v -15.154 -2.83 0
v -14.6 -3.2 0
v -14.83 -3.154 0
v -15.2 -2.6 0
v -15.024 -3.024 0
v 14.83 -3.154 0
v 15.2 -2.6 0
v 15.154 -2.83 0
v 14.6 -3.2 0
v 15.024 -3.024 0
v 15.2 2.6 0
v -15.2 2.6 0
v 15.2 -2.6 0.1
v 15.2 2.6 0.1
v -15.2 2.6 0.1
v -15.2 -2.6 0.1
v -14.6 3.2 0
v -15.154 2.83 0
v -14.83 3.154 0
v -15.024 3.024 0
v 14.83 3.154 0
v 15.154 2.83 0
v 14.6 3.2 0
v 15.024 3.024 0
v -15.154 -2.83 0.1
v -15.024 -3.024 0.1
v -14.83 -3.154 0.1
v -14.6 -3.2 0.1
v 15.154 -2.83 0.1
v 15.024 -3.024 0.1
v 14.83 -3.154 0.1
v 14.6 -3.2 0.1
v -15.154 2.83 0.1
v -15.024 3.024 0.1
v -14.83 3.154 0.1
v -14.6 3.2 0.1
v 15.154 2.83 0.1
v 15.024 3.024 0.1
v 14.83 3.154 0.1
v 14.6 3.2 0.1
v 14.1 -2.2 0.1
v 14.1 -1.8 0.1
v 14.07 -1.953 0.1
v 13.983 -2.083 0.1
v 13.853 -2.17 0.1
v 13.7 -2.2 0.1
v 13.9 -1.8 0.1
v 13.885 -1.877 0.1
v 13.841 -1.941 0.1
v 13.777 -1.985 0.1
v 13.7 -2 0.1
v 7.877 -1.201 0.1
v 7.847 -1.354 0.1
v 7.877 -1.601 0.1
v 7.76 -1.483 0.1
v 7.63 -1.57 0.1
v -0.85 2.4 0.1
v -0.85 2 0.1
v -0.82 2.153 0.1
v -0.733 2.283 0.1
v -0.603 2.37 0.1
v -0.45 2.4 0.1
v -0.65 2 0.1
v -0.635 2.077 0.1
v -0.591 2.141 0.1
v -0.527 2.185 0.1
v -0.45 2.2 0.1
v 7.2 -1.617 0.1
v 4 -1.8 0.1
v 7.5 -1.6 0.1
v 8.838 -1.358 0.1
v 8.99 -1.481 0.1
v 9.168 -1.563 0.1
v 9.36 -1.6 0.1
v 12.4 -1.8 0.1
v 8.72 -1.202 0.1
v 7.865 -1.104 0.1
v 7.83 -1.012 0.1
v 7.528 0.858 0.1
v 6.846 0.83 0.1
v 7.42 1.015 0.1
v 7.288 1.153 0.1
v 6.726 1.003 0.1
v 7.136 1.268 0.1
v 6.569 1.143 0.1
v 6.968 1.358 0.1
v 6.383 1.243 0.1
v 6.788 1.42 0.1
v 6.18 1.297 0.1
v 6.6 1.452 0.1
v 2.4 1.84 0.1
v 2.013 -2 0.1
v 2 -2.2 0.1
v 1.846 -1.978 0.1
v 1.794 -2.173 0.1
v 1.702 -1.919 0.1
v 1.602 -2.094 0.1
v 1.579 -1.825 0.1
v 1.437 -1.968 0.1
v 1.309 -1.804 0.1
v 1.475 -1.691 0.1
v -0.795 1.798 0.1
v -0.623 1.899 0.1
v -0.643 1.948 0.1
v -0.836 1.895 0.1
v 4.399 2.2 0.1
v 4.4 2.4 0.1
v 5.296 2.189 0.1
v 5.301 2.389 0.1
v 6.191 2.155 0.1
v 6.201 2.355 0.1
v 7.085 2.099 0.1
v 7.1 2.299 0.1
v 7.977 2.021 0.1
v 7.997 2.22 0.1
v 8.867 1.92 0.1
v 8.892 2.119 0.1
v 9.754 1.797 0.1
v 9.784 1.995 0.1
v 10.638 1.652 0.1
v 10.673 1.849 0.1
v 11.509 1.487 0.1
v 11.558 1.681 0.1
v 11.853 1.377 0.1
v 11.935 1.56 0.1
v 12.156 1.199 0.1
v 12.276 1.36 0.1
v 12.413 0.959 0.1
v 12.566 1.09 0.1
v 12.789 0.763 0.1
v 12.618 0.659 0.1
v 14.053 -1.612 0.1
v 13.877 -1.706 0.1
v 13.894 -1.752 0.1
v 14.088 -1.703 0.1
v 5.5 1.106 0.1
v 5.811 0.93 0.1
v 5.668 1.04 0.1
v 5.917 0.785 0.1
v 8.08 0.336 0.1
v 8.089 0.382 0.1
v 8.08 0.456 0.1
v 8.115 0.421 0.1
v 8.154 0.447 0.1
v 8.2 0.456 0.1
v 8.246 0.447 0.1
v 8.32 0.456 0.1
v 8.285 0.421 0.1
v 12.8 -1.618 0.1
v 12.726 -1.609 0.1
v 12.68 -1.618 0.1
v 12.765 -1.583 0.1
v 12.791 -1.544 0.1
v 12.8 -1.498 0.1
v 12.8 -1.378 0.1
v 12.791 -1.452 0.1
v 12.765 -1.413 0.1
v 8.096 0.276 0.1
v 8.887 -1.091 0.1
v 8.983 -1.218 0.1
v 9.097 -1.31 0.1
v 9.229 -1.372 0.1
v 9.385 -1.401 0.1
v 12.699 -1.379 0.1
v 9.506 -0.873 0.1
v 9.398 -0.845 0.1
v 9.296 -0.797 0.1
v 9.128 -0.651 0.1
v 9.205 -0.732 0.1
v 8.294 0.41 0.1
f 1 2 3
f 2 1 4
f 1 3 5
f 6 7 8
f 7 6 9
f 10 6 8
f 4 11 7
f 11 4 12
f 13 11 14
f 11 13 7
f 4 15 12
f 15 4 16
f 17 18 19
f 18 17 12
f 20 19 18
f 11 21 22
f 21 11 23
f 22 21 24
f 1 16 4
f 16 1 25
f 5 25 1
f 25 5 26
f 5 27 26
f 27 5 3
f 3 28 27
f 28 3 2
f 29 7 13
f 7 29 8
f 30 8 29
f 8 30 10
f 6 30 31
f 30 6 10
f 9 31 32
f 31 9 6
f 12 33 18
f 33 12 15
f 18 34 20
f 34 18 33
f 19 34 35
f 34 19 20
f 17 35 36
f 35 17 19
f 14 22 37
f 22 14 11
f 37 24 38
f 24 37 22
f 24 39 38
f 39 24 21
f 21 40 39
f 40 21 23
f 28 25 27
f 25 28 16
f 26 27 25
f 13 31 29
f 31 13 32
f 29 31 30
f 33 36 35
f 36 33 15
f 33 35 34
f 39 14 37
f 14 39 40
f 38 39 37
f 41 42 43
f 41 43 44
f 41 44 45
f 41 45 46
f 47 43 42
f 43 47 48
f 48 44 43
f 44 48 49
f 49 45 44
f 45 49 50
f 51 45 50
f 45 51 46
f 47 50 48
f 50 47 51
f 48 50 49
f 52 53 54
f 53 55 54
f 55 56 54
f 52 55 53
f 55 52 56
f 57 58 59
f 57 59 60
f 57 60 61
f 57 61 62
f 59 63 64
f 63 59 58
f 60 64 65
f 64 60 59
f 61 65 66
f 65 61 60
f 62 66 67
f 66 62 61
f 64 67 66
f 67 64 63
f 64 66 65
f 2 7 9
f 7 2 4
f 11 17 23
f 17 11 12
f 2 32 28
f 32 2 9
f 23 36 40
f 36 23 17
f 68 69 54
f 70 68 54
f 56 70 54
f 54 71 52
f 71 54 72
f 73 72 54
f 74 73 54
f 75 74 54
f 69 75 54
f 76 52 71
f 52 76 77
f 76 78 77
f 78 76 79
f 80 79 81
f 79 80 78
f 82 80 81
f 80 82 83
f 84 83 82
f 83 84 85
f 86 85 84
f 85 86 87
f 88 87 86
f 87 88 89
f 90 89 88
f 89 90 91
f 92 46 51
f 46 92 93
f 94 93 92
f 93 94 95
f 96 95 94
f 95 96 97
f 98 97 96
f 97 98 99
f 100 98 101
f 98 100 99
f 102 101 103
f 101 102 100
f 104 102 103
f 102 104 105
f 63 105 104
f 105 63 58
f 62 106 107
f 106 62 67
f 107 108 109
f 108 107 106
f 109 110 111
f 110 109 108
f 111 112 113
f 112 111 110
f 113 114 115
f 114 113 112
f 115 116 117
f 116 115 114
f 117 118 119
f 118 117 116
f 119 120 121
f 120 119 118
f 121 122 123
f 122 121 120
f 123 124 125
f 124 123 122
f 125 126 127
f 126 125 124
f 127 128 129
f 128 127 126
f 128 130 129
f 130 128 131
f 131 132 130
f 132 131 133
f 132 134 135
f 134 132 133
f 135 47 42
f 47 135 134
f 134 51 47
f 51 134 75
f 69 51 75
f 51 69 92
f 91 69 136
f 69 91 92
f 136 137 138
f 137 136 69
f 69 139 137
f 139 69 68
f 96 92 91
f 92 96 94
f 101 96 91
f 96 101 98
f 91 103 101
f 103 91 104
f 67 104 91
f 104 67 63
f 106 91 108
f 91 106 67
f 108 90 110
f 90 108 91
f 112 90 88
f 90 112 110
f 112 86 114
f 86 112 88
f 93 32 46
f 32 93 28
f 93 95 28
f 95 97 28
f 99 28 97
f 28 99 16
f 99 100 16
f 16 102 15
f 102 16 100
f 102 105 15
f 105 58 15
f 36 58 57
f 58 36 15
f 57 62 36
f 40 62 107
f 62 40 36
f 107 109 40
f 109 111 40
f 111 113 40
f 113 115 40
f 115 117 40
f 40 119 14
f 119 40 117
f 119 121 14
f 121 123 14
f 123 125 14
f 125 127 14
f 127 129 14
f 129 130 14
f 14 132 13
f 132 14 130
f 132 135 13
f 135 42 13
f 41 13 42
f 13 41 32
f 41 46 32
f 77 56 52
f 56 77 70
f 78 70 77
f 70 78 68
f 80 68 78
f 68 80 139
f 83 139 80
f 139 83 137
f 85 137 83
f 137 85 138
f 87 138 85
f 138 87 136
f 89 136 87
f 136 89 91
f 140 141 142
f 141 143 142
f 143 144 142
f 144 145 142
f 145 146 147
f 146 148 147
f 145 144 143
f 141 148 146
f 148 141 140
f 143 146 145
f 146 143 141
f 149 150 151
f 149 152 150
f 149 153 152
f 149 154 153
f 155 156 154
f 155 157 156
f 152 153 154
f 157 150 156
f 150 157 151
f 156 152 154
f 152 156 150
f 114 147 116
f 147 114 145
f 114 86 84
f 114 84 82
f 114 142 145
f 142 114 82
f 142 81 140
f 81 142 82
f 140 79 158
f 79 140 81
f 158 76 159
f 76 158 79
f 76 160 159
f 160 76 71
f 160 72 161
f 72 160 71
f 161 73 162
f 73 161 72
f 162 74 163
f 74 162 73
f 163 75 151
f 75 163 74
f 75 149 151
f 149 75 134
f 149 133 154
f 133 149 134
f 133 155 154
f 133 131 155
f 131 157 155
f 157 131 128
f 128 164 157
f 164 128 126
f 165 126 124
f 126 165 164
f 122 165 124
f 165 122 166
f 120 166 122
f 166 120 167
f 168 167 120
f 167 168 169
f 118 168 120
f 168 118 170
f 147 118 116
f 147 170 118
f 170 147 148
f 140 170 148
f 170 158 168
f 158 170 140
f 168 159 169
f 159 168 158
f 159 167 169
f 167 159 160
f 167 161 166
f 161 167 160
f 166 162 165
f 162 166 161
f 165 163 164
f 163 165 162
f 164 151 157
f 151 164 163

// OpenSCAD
// file: ../p/box3u12.scad
use <../lib.scad>
function ldraw_lib__box3u12() = [
// 0 Box with 3 Parallel Faces without Any Edges
// 0 Name: box3u12.dat
// 0 Author: J.C. Tchang [tchang]
// 0 !LDRAW_ORG Primitive UPDATE 2014-02
// 0 !LICENSE Licensed under CC BY 4.0 : see CAreadme.txt
// 
// 0 BFC CERTIFY CCW
  [0,"BFC","CERTIFY"],
  [0,"BFC","CCW"],
// 
// 0 !HISTORY 2014-12-23 [PTadmin] Official Update 2014-02
// 
// 
// 4 16 -1 1 1 1 1 1 1 1 -1 -1 1 -1
  [4,16,-1,1,1,1,1,1,1,1,-1,-1,1,-1],
// 4 16 -1 1 1 -1 0 1 1 0 1 1 1 1
  [4,16,-1,1,1,-1,0,1,1,0,1,1,1,1],
// 4 16 1 1 -1 1 0 -1 -1 0 -1 -1 1 -1
  [4,16,1,1,-1,1,0,-1,-1,0,-1,-1,1,-1],
];
module ldraw_lib__box3u12(step=0, col=false, unit=2/5, alt=false, line=0.2, solid=!$preview)
    makepoly(ldraw_lib__box3u12(), step=step, col=col, unit=unit, alt=alt, line=line, solid=solid);
ldraw_lib__box3u12(line=0.2);
// file: ../p/3-16ndis.scad
use <../lib.scad>
function ldraw_lib__3_16ndis() = [
// 0 Disc Negative 0.1875
// 0 Name: 3-16ndis.dat
// 0 Author: Magnus Forsberg [MagFors]
// 0 !LDRAW_ORG Primitive UPDATE 2024-01
// 0 !LICENSE Licensed under CC BY 4.0 : see CAreadme.txt
// 
// 0 BFC CERTIFY CCW
  [0,"BFC","CERTIFY"],
  [0,"BFC","CCW"],
// 
// 0 !HISTORY 2009-05-02 [PTadmin] Official Update 2009-01
// 0 !HISTORY 2024-01-03 [MagFors] Complete regeneration, original by guyvivan
// 0 !HISTORY 2024-01-29 [OrionP] Official Update 2024-01
// 
// 3 16 1 0 1 0.9239 0 0.3827 1 0 0
  [3,16,1,0,1,0.9239,0,0.3827,1,0,0],
// 3 16 1 0 1 0.7071 0 0.7071 0.9239 0 0.3827
  [3,16,1,0,1,0.7071,0,0.7071,0.9239,0,0.3827],
// 3 16 1 0 1 0.3827 0 0.9239 0.7071 0 0.7071
  [3,16,1,0,1,0.3827,0,0.9239,0.7071,0,0.7071],
// 0 // Build by LDPartEditor (PrimGen 2.X)
];
module ldraw_lib__3_16ndis(step=0, col=false, unit=2/5, alt=false, line=0.2, solid=!$preview)
    makepoly(ldraw_lib__3_16ndis(), step=step, col=col, unit=unit, alt=alt, line=line, solid=solid);
ldraw_lib__3_16ndis(line=0.2);
// file: ../p/3-16chrd.scad
use <../lib.scad>
function ldraw_lib__3_16chrd() = [
// 0 Chord 0.1875
// 0 Name: 3-16chrd.dat
// 0 Author: Niels Karsdorp [nielsk]
// 0 !LDRAW_ORG Primitive UPDATE 2009-01
// 0 !LICENSE Licensed under CC BY 4.0 : see CAreadme.txt
// 
// 0 BFC CERTIFY CCW
  [0,"BFC","CERTIFY"],
  [0,"BFC","CCW"],
// 
// 0 !HISTORY 2009-05-02 [PTadmin] Official Update 2009-01
// 
// 
// 4 16 1 0 0 0.9239 0 0.3827 0.7071 0 0.7071 0.3827 0 0.9239
  [4,16,1,0,0,0.9239,0,0.3827,0.7071,0,0.7071,0.3827,0,0.9239],
// 0
// 
];
module ldraw_lib__3_16chrd(step=0, col=false, unit=2/5, alt=false, line=0.2, solid=!$preview)
    makepoly(ldraw_lib__3_16chrd(), step=step, col=col, unit=unit, alt=alt, line=line, solid=solid);
ldraw_lib__3_16chrd(line=0.2);
// file: ../p/1-4ring1.scad
use <../lib.scad>
function ldraw_lib__1_4ring1() = [
// 0 Ring  1 x 0.25
// 0 Name: 1-4ring1.dat
// 0 Author: Chris Dee [cwdee]
// 0 !LDRAW_ORG Primitive UPDATE 2012-01
// 0 !LICENSE Licensed under CC BY 4.0 : see CAreadme.txt
// 
// 0 BFC CERTIFY CCW
  [0,"BFC","CERTIFY"],
  [0,"BFC","CCW"],
// 
// 0 !HISTORY 2000-05-07 [PTadmin] Official Update 2000-01
// 0 !HISTORY 2002-11-22 [hafhead] Added BFC statement
// 0 !HISTORY 2002-11-30 [PTadmin] Official Update 2002-05
// 0 !HISTORY 2007-06-22 [PTadmin] Header formatted for Contributor Agreement
// 0 !HISTORY 2008-07-01 [PTadmin] Official Update 2008-01
// 0 !HISTORY 2012-02-16 [Philo] Changed to CCW
// 0 !HISTORY 2012-03-30 [PTadmin] Official Update 2012-01
// 
// 
// 4 16 2 0 0 1.8478 0 0.7654 0.9239 0 0.3827 1 0 0
  [4,16,2,0,0,1.8478,0,0.7654,0.9239,0,0.3827,1,0,0],
// 4 16 1.8478 0 0.7654 1.4142 0 1.4142 0.7071 0 0.7071 0.9239 0 0.3827
  [4,16,1.8478,0,0.7654,1.4142,0,1.4142,0.7071,0,0.7071,0.9239,0,0.3827],
// 4 16 1.4142 0 1.4142 0.7654 0 1.8478 0.3827 0 0.9239 0.7071 0 0.7071
  [4,16,1.4142,0,1.4142,0.7654,0,1.8478,0.3827,0,0.9239,0.7071,0,0.7071],
// 4 16 0.7654 0 1.8478 0 0 2 0 0 1 0.3827 0 0.9239
  [4,16,0.7654,0,1.8478,0,0,2,0,0,1,0.3827,0,0.9239],
];
module ldraw_lib__1_4ring1(step=0, col=false, unit=2/5, alt=false, line=0.2, solid=!$preview)
    makepoly(ldraw_lib__1_4ring1(), step=step, col=col, unit=unit, alt=alt, line=line, solid=solid);
ldraw_lib__1_4ring1(line=0.2);
// file: ../p/1-4ndis.scad
use <../lib.scad>
function ldraw_lib__1_4ndis() = [
// 0 Disc Negative 0.25
// 0 Name: 1-4ndis.dat
// 0 Author: James Jessiman
// 0 !LDRAW_ORG Primitive UPDATE 2012-01
// 0 !LICENSE Licensed under CC BY 4.0 : see CAreadme.txt
// 
// 0 BFC CERTIFY CCW
  [0,"BFC","CERTIFY"],
  [0,"BFC","CCW"],
// 
// 0 !HISTORY 2002-03-23 [sbliss] Added BFC Statement
// 0 !HISTORY 2002-04-25 [PTadmin] Official Update 2002-02
// 0 !HISTORY 2007-06-22 [PTadmin] Header formatted for Contributor Agreement
// 0 !HISTORY 2008-07-01 [PTadmin] Official Update 2008-01
// 0 !HISTORY 2012-02-16 [Philo] Changed to CCW
// 0 !HISTORY 2012-03-30 [PTadmin] Official Update 2012-01
// 
// 
// 3 16 0.9239 0 0.3827 1 0 0 1 0 1
  [3,16,0.9239,0,0.3827,1,0,0,1,0,1],
// 3 16 0.7071 0 0.7071 0.9239 0 0.3827 1 0 1
  [3,16,0.7071,0,0.7071,0.9239,0,0.3827,1,0,1],
// 3 16 0.3827 0 0.9239 0.7071 0 0.7071 1 0 1
  [3,16,0.3827,0,0.9239,0.7071,0,0.7071,1,0,1],
// 3 16 0 0 1 0.3827 0 0.9239 1 0 1
  [3,16,0,0,1,0.3827,0,0.9239,1,0,1],
];
module ldraw_lib__1_4ndis(step=0, col=false, unit=2/5, alt=false, line=0.2, solid=!$preview)
    makepoly(ldraw_lib__1_4ndis(), step=step, col=col, unit=unit, alt=alt, line=line, solid=solid);
ldraw_lib__1_4ndis(line=0.2);
// file: ../p/1-4cyli.scad
use <../lib.scad>
function ldraw_lib__1_4cyli() = [
// 0 Cylinder 0.25
// 0 Name: 1-4cyli.dat
// 0 Author: James Jessiman
// 0 !LDRAW_ORG Primitive UPDATE 2012-01
// 0 !LICENSE Licensed under CC BY 4.0 : see CAreadme.txt
// 
// 0 BFC CERTIFY CCW
  [0,"BFC","CERTIFY"],
  [0,"BFC","CCW"],
// 
// 0 !HISTORY 2002-03-23 [sbliss] Added BFC statement.
// 0 !HISTORY 2002-04-25 [PTadmin] Official Update 2002-02
// 0 !HISTORY 2007-06-22 [PTadmin] Header formatted for Contributor Agreement
// 0 !HISTORY 2008-07-01 [PTadmin] Official Update 2008-01
// 0 !HISTORY 2012-02-16 [Philo] Changed to CCW
// 0 !HISTORY 2012-03-30 [PTadmin] Official Update 2012-01
// 
// 
// 4 16 1 1 0 0.9239 1 0.3827 0.9239 0 0.3827 1 0 0
  [4,16,1,1,0,0.9239,1,0.3827,0.9239,0,0.3827,1,0,0],
// 5 24 1 0 0 1 1 0 0.9239 0 0.3827 1 0 -1
  [5,24,1,0,0,1,1,0,0.9239,0,0.3827,1,0,-1],
// 4 16 0.9239 1 0.3827 0.7071 1 0.7071 0.7071 0 0.7071 0.9239 0 0.3827
  [4,16,0.9239,1,0.3827,0.7071,1,0.7071,0.7071,0,0.7071,0.9239,0,0.3827],
// 5 24 0.9239 0 0.3827 0.9239 1 0.3827 0.7071 0 0.7071 1 0 0
  [5,24,0.9239,0,0.3827,0.9239,1,0.3827,0.7071,0,0.7071,1,0,0],
// 4 16 0.7071 1 0.7071 0.3827 1 0.9239 0.3827 0 0.9239 0.7071 0 0.7071
  [4,16,0.7071,1,0.7071,0.3827,1,0.9239,0.3827,0,0.9239,0.7071,0,0.7071],
// 5 24 0.7071 0 0.7071 0.7071 1 0.7071 0.3827 0 0.9239 0.9239 0 0.3827
  [5,24,0.7071,0,0.7071,0.7071,1,0.7071,0.3827,0,0.9239,0.9239,0,0.3827],
// 4 16 0.3827 1 0.9239 0 1 1 0 0 1 0.3827 0 0.9239
  [4,16,0.3827,1,0.9239,0,1,1,0,0,1,0.3827,0,0.9239],
// 5 24 0.3827 0 0.9239 0.3827 1 0.9239 0 0 1 0.7071 0 0.7071
  [5,24,0.3827,0,0.9239,0.3827,1,0.9239,0,0,1,0.7071,0,0.7071],
// 5 24 0 0 1 0 1 1 0.3827 0 0.9239 -1 0 1
  [5,24,0,0,1,0,1,1,0.3827,0,0.9239,-1,0,1],
];
module ldraw_lib__1_4cyli(step=0, col=false, unit=2/5, alt=false, line=0.2, solid=!$preview)
    makepoly(ldraw_lib__1_4cyli(), step=step, col=col, unit=unit, alt=alt, line=line, solid=solid);
ldraw_lib__1_4cyli(line=0.2);
// file: ../p/1-4chrd.scad
use <../lib.scad>
function ldraw_lib__1_4chrd() = [
// 0 Chord 0.25
// 0 Name: 1-4chrd.dat
// 0 Author: Max Martin Richter [MMR1988]
// 0 !LDRAW_ORG Primitive UPDATE 2023-05
// 0 !LICENSE Licensed under CC BY 4.0 : see CAreadme.txt
// 
// 0 BFC CERTIFY CCW
  [0,"BFC","CERTIFY"],
  [0,"BFC","CCW"],
// 
// 0 !HISTORY 2004-04-22 [PTadmin] Official Update 2004-02
// 0 !HISTORY 2007-10-09 [PTadmin] Header formatted for Contributor Agreement
// 0 !HISTORY 2008-07-01 [PTadmin] Official Update 2008-01
// 0 !HISTORY 2012-08-02 [MMR1988] Re-creation with PrimGen2 and Rectifier
// 0 !HISTORY 2012-08-09 [PTadmin] Official Update 2012-02
// 0 !HISTORY 2023-10-27 [OrionP] Change author to MMR1988 from hafhead
// 0 !HISTORY 2023-10-31 [OrionP] Official Update 2023-05
// 
// 4 16 0.9239 0 0.3827 0.3827 0 0.9239 0 0 1 1 0 0
  [4,16,0.9239,0,0.3827,0.3827,0,0.9239,0,0,1,1,0,0],
// 3 16 0.7071 0 0.7071 0.3827 0 0.9239 0.9239 0 0.3827
  [3,16,0.7071,0,0.7071,0.3827,0,0.9239,0.9239,0,0.3827],
];
module ldraw_lib__1_4chrd(step=0, col=false, unit=2/5, alt=false, line=0.2, solid=!$preview)
    makepoly(ldraw_lib__1_4chrd(), step=step, col=col, unit=unit, alt=alt, line=line, solid=solid);
ldraw_lib__1_4chrd(line=0.2);
// file: ../p/3-8ndis.scad
use <../lib.scad>
function ldraw_lib__3_8ndis() = [
// 0 Disc Negative 0.375
// 0 Name: 3-8ndis.dat
// 0 Author: Alex Taylor [anathema]
// 0 !LDRAW_ORG Primitive UPDATE 2009-02
// 0 !LICENSE Licensed under CC BY 4.0 : see CAreadme.txt
// 
// 0 BFC CERTIFY CCW
  [0,"BFC","CERTIFY"],
  [0,"BFC","CCW"],
// 
// 0 !HISTORY 2009-09-03 [PTadmin] Official Update 2009-02
// 
// 
// 3 16 1 0 1 0.9239 0 0.3827 1 0 0
  [3,16,1,0,1,0.9239,0,0.3827,1,0,0],
// 3 16 1 0 1 0.7071 0 0.7071 0.9239 0 0.3827
  [3,16,1,0,1,0.7071,0,0.7071,0.9239,0,0.3827],
// 3 16 1 0 1 0.3827 0 0.9239 0.7071 0 0.7071
  [3,16,1,0,1,0.3827,0,0.9239,0.7071,0,0.7071],
// 3 16 1 0 1 0 0 1 0.3827 0 0.9239
  [3,16,1,0,1,0,0,1,0.3827,0,0.9239],
// 3 16 -1 0 1 -0.3827 0 0.9239 0 0 1
  [3,16,-1,0,1,-0.3827,0,0.9239,0,0,1],
// 3 16 -1 0 1 -0.7071 0 0.7071 -0.3827 0 0.9239
  [3,16,-1,0,1,-0.7071,0,0.7071,-0.3827,0,0.9239],
// 0
];
module ldraw_lib__3_8ndis(step=0, col=false, unit=2/5, alt=false, line=0.2, solid=!$preview)
    makepoly(ldraw_lib__3_8ndis(), step=step, col=col, unit=unit, alt=alt, line=line, solid=solid);
ldraw_lib__3_8ndis(line=0.2);
// file: ../p/3-8chrd.scad
use <../lib.scad>
function ldraw_lib__3_8chrd() = [
// 0 Chord 0.375
// 0 Name: 3-8chrd.dat
// 0 Author: Donald Sutter [technog]
// 0 !LDRAW_ORG Primitive UPDATE 2005-01
// 0 !LICENSE Licensed under CC BY 4.0 : see CAreadme.txt
// 
// 0 BFC CERTIFY CCW
  [0,"BFC","CERTIFY"],
  [0,"BFC","CCW"],
// 
// 0 !HISTORY 2004-01-07 [Steffen] added primitive code for POVray
// 0 !HISTORY 2004-03-18 [mkennedy] removed pov code and rearanged polygons.
// 0 !HISTORY 2004-09-12 [cwdee] reversed winding and standardised precision
// 0 !HISTORY 2005-12-28 [PTadmin] Official Update 2005-01
// 0 !HISTORY 2007-06-24 [PTadmin] Header formatted for Contributor Agreement
// 0 !HISTORY 2008-07-01 [PTadmin] Official Update 2008-01
// 
// 
// 3 16 0.7071 0 0.7071 0.3827 0 0.9239 0 0 1
  [3,16,0.7071,0,0.7071,0.3827,0,0.9239,0,0,1],
// 4 16 0.9239 0 0.3827 -0.3827 0 0.9239 -0.7071 0 0.7071 1 0 0
  [4,16,0.9239,0,0.3827,-0.3827,0,0.9239,-0.7071,0,0.7071,1,0,0],
// 4 16 0.7071 0 0.7071 0 0 1 -0.3827 0 0.9239 0.9239 0 0.3827
  [4,16,0.7071,0,0.7071,0,0,1,-0.3827,0,0.9239,0.9239,0,0.3827],
// 0
];
module ldraw_lib__3_8chrd(step=0, col=false, unit=2/5, alt=false, line=0.2, solid=!$preview)
    makepoly(ldraw_lib__3_8chrd(), step=step, col=col, unit=unit, alt=alt, line=line, solid=solid);
ldraw_lib__3_8chrd(line=0.2);
// main file
use <../lib.scad>
use <../p/3-8chrd.scad>
use <../p/3-8ndis.scad>
use <s/6141955ds01.scad>
function ldraw_lib__6141955k() = [
// 0 Sticker  0.8 x  3.8 with Black Air Vents and White Reflex on Blue Background Right (Needs Work)
// 0 Name: 6141955k.dat
// 0 Author: Massimo Maso [Sirio]
// 0 !LDRAW_ORG Part UPDATE 2025-03
// 0 !LICENSE Licensed under CC BY 4.0 : see CAreadme.txt
// 
// 0 !HELP Needs work: Some parts should be halftones.
// 0 !HELP I indicated them as halftone color code disc - color code ndis.
// 0 !HELP For now I don't have enough information to create the matrix of dots.
// 
// 0 BFC CERTIFY CCW
  [0,"BFC","CERTIFY"],
  [0,"BFC","CCW"],
// 
// 0 !KEYWORDS Bricklink 75871stk01a, Brickowl 197362, Ford, GT, Mustang
// 0 !KEYWORDS Rebrickable 24746, Set 75871, Speed Champions
// 
// 0 !HISTORY 2025-03-30 [OrionP] Official Update 2025-03
// 
// 
// 0 // Subparts
// 1 16 0 0 0 1 0 0 0 1 0 0 0 -1 s\6141955ds01.dat
  [1,16,0,0,0,1,0,0,0,1,0,0,0,-1, ldraw_lib__s__6141955ds01()],
// 0 // Primitives
// 1 1 20.5 -.25 .84 -.3 0 0 0 1 0 0 0 .3 3-8ndis.dat
  [1,1,20.5,-.25,.84,-.3,0,0,0,1,0,0,0,.3, ldraw_lib__3_8ndis()],
// 1 15 20.5 -.25 .84 -.3 0 0 0 1 0 0 0 .3 3-8chrd.dat
  [1,15,20.5,-.25,.84,-.3,0,0,0,1,0,0,0,.3, ldraw_lib__3_8chrd()],
// 1 1 31.7 -.25 -3.7443 0 0 .3 0 1 0 -.3 0 0 3-8ndis.dat
  [1,1,31.7,-.25,-3.7443,0,0,.3,0,1,0,-.3,0,0, ldraw_lib__3_8ndis()],
// 1 15 31.7 -.25 -3.7443 0 0 .3 0 1 0 -.3 0 0 3-8chrd.dat
  [1,15,31.7,-.25,-3.7443,0,0,.3,0,1,0,-.3,0,0, ldraw_lib__3_8chrd()],
// 0 // Top face
// 0 // Blue faces
// 4 1 19.9424 -.25 5.0521 20.5 -.25 1.14 20.8 -.25 1.14 22.1675 -.25 4.8005
  [4,1,19.9424,-.25,5.0521,20.5,-.25,1.14,20.8,-.25,1.14,22.1675,-.25,4.8005],
// 3 1 19.9424 -.25 5.0521 17.4205 -.25 3.3942 17.8412 -.25 3.17
  [3,1,19.9424,-.25,5.0521,17.4205,-.25,3.3942,17.8412,-.25,3.17],
// 3 1 19.9424 -.25 5.0521 17.8412 -.25 3.17 18.221 -.25 2.8819
  [3,1,19.9424,-.25,5.0521,17.8412,-.25,3.17,18.221,-.25,2.8819],
// 4 1 19.9424 -.25 5.0521 18.221 -.25 2.8819 20.2 -.25 1.14 20.5 -.25 1.14
  [4,1,19.9424,-.25,5.0521,18.221,-.25,2.8819,20.2,-.25,1.14,20.5,-.25,1.14],
// 4 1 18.5504 -.25 2.5374 20.2 -.25 .84 20.2 -.25 1.14 18.221 -.25 2.8819
  [4,1,18.5504,-.25,2.5374,20.2,-.25,.84,20.2,-.25,1.14,18.221,-.25,2.8819],
// 4 1 18.5504 -.25 2.5374 18.8211 -.25 2.145 20.2403 -.2501 .6898 20.2 -.25 .84
  [4,1,18.5504,-.25,2.5374,18.8211,-.25,2.145,20.2403,-.2501,.6898,20.2,-.25,.84],
// 4 1 21.8 -.25 -3.0056 22.2175 -.25 -2.7287 20.2403 -.2501 .6898 18.8211 -.25 2.145
  [4,1,21.8,-.25,-3.0056,22.2175,-.25,-2.7287,20.2403,-.2501,.6898,18.8211,-.25,2.145],
// 4 1 21.8 -.25 -3.0056 22.0948 -.25 -3.3959 22.4567 -.25 -3.0454 22.2175 -.25 -2.7287
  [4,1,21.8,-.25,-3.0056,22.0948,-.25,-3.3959,22.4567,-.25,-3.0454,22.2175,-.25,-2.7287],
// 4 1 22.4756 -.25 -3.703 22.7415 -.25 -3.2751 22.4567 -.25 -3.0454 22.0948 -.25 -3.3959
  [4,1,22.4756,-.25,-3.703,22.7415,-.25,-3.2751,22.4567,-.25,-3.0454,22.0948,-.25,-3.3959],
// 4 1 22.4756 -.25 -3.703 22.9195 -.25 -3.9084 23.0736 -.25 -3.4288 22.7415 -.25 -3.2751
  [4,1,22.4756,-.25,-3.703,22.9195,-.25,-3.9084,23.0736,-.25,-3.4288,22.7415,-.25,-3.2751],
// 4 1 23.4 -.25 -4 23.4634 -.25 -3.5031 23.0736 -.25 -3.4288 22.9195 -.25 -3.9084
  [4,1,23.4,-.25,-4,23.4634,-.25,-3.5031,23.0736,-.25,-3.4288,22.9195,-.25,-3.9084],
// 4 1 23.4 -.25 -4 31 -.25 -4.5 31.7 -.25 -4.0443 23.4634 -.25 -3.5031
  [4,1,23.4,-.25,-4,31,-.25,-4.5,31.7,-.25,-4.0443,23.4634,-.25,-3.5031],
// 4 1 34.7351 -.25 -4.3789 32 -.25 -4.0443 31.7 -.25 -4.0443 31 -.25 -4.5
  [4,1,34.7351,-.25,-4.3789,32,-.25,-4.0443,31.7,-.25,-4.0443,31,-.25,-4.5],
// 4 1 34.7351 -.25 -4.3789 34.6914 -.25 -4.2651 32 -.25 -3.7443 32 -.25 -4.0443
  [4,1,34.7351,-.25,-4.3789,34.6914,-.25,-4.2651,32,-.25,-3.7443,32,-.25,-4.0443],
// 3 1 34.6914 -.25 -4.2651 32 -.25 -3.4443 32 -.25 -3.7443
  [3,1,34.6914,-.25,-4.2651,32,-.25,-3.4443,32,-.25,-3.7443],
// 3 1 34.6914 -.25 -4.2651 31.5439 -.25 1.648 32 -.25 -3.4443
  [3,1,34.6914,-.25,-4.2651,31.5439,-.25,1.648,32,-.25,-3.4443],
// 4 1 31.0324 -.25 2.3968 31.91213 -.25 -3.53217 32 -.25 -3.4443 31.5439 -.25 1.648
  [4,1,31.0324,-.25,2.3968,31.91213,-.25,-3.53217,32,-.25,-3.4443,31.5439,-.25,1.648],
// 4 1 31.0324 -.25 2.3968 30.3899 -.25 2.9967 31.747 -.25 -3.448 31.91213 -.25 -3.53217
  [4,1,31.0324,-.25,2.3968,30.3899,-.25,2.9967,31.747,-.25,-3.448,31.91213,-.25,-3.53217],
// 4 1 29.6318 -.25 3.4416 23.7649 -.25 -2.1815 31.747 -.25 -3.448 30.3899 -.25 2.9967
  [4,1,29.6318,-.25,3.4416,23.7649,-.25,-2.1815,31.747,-.25,-3.448,30.3899,-.25,2.9967],
// 4 1 29.6318 -.25 3.4416 28.7713 -.25 3.7176 23.4939 -.25 -2.112 23.7649 -.25 -2.1815
  [4,1,29.6318,-.25,3.4416,28.7713,-.25,3.7176,23.4939,-.25,-2.112,23.7649,-.25,-2.1815],
// 4 1 26.5953 -.25 4.1307 23.2404 -.25 -1.9935 23.4939 -.25 -2.112 28.7713 -.25 3.7176
  [4,1,26.5953,-.25,4.1307,23.2404,-.25,-1.9935,23.4939,-.25,-2.112,28.7713,-.25,3.7176],
// 4 1 26.5953 -.25 4.1307 22.8207 -.25 -1.627 23.0134 -.25 -1.8299 23.2404 -.25 -1.9935
  [4,1,26.5953,-.25,4.1307,22.8207,-.25,-1.627,23.0134,-.25,-1.8299,23.2404,-.25,-1.9935],
// 4 1 26.5953 -.25 4.1307 24.3856 -.25 4.4933 20.7359 -.25 1.0254 22.8207 -.25 -1.627
  [4,1,26.5953,-.25,4.1307,24.3856,-.25,4.4933,20.7359,-.25,1.0254,22.8207,-.25,-1.627],
// 3 1 20.8 -.25 1.14 24.3856 -.25 4.4933 22.1675 -.25 4.8005
  [3,1,20.8,-.25,1.14,24.3856,-.25,4.4933,22.1675,-.25,4.8005],
// 4 1 20.8 -.25 1.14 20.71213 -.25 1.05213 20.7359 -.25 1.0254 24.3856 -.25 4.4933
  [4,1,20.8,-.25,1.14,20.71213,-.25,1.05213,20.7359,-.25,1.0254,24.3856,-.25,4.4933],
// 0 // White faces - Actually halftone 1 disc - 15 ndis
// 3 15 20.2 -.25 .84 20.7359 -.25 1.0254 20.71213 -.25 1.05213
  [3,15,20.2,-.25,.84,20.7359,-.25,1.0254,20.71213,-.25,1.05213],
// 4 15 20.2 -.25 .84 20.2403 -.2501 .6898 22.8207 -.25 -1.627 20.7359 -.25 1.0254
  [4,15,20.2,-.25,.84,20.2403,-.2501,.6898,22.8207,-.25,-1.627,20.7359,-.25,1.0254],
// 4 15 22.2175 -.25 -2.7287 23.0134 -.25 -1.8299 22.8207 -.25 -1.627 20.2403 -.2501 .6898
  [4,15,22.2175,-.25,-2.7287,23.0134,-.25,-1.8299,22.8207,-.25,-1.627,20.2403,-.2501,.6898],
// 4 15 22.2175 -.25 -2.7287 22.4567 -.25 -3.0454 23.2404 -.25 -1.9935 23.0134 -.25 -1.8299
  [4,15,22.2175,-.25,-2.7287,22.4567,-.25,-3.0454,23.2404,-.25,-1.9935,23.0134,-.25,-1.8299],
// 4 15 22.7415 -.25 -3.2751 23.4939 -.25 -2.112 23.2404 -.25 -1.9935 22.4567 -.25 -3.0454
  [4,15,22.7415,-.25,-3.2751,23.4939,-.25,-2.112,23.2404,-.25,-1.9935,22.4567,-.25,-3.0454],
// 4 15 22.7415 -.25 -3.2751 23.0736 -.25 -3.4288 23.7649 -.25 -2.1815 23.4939 -.25 -2.112
  [4,15,22.7415,-.25,-3.2751,23.0736,-.25,-3.4288,23.7649,-.25,-2.1815,23.4939,-.25,-2.112],
// 4 15 23.4634 -.25 -3.5031 31.747 -.25 -3.448 23.7649 -.25 -2.1815 23.0736 -.25 -3.4288
  [4,15,23.4634,-.25,-3.5031,31.747,-.25,-3.448,23.7649,-.25,-2.1815,23.0736,-.25,-3.4288],
// 4 15 23.4634 -.25 -3.5031 31.7 -.25 -4.0443 31.91213 -.25 -3.53217 31.747 -.25 -3.448
  [4,15,23.4634,-.25,-3.5031,31.7,-.25,-4.0443,31.91213,-.25,-3.53217,31.747,-.25,-3.448],
];
module ldraw_lib__6141955k(step=0, col=false, unit=2/5, alt=false, line=0.2, solid=!$preview)
    makepoly(ldraw_lib__6141955k(), step=step, col=col, unit=unit, alt=alt, line=line, solid=solid);
ldraw_lib__6141955k(line=0.2);
